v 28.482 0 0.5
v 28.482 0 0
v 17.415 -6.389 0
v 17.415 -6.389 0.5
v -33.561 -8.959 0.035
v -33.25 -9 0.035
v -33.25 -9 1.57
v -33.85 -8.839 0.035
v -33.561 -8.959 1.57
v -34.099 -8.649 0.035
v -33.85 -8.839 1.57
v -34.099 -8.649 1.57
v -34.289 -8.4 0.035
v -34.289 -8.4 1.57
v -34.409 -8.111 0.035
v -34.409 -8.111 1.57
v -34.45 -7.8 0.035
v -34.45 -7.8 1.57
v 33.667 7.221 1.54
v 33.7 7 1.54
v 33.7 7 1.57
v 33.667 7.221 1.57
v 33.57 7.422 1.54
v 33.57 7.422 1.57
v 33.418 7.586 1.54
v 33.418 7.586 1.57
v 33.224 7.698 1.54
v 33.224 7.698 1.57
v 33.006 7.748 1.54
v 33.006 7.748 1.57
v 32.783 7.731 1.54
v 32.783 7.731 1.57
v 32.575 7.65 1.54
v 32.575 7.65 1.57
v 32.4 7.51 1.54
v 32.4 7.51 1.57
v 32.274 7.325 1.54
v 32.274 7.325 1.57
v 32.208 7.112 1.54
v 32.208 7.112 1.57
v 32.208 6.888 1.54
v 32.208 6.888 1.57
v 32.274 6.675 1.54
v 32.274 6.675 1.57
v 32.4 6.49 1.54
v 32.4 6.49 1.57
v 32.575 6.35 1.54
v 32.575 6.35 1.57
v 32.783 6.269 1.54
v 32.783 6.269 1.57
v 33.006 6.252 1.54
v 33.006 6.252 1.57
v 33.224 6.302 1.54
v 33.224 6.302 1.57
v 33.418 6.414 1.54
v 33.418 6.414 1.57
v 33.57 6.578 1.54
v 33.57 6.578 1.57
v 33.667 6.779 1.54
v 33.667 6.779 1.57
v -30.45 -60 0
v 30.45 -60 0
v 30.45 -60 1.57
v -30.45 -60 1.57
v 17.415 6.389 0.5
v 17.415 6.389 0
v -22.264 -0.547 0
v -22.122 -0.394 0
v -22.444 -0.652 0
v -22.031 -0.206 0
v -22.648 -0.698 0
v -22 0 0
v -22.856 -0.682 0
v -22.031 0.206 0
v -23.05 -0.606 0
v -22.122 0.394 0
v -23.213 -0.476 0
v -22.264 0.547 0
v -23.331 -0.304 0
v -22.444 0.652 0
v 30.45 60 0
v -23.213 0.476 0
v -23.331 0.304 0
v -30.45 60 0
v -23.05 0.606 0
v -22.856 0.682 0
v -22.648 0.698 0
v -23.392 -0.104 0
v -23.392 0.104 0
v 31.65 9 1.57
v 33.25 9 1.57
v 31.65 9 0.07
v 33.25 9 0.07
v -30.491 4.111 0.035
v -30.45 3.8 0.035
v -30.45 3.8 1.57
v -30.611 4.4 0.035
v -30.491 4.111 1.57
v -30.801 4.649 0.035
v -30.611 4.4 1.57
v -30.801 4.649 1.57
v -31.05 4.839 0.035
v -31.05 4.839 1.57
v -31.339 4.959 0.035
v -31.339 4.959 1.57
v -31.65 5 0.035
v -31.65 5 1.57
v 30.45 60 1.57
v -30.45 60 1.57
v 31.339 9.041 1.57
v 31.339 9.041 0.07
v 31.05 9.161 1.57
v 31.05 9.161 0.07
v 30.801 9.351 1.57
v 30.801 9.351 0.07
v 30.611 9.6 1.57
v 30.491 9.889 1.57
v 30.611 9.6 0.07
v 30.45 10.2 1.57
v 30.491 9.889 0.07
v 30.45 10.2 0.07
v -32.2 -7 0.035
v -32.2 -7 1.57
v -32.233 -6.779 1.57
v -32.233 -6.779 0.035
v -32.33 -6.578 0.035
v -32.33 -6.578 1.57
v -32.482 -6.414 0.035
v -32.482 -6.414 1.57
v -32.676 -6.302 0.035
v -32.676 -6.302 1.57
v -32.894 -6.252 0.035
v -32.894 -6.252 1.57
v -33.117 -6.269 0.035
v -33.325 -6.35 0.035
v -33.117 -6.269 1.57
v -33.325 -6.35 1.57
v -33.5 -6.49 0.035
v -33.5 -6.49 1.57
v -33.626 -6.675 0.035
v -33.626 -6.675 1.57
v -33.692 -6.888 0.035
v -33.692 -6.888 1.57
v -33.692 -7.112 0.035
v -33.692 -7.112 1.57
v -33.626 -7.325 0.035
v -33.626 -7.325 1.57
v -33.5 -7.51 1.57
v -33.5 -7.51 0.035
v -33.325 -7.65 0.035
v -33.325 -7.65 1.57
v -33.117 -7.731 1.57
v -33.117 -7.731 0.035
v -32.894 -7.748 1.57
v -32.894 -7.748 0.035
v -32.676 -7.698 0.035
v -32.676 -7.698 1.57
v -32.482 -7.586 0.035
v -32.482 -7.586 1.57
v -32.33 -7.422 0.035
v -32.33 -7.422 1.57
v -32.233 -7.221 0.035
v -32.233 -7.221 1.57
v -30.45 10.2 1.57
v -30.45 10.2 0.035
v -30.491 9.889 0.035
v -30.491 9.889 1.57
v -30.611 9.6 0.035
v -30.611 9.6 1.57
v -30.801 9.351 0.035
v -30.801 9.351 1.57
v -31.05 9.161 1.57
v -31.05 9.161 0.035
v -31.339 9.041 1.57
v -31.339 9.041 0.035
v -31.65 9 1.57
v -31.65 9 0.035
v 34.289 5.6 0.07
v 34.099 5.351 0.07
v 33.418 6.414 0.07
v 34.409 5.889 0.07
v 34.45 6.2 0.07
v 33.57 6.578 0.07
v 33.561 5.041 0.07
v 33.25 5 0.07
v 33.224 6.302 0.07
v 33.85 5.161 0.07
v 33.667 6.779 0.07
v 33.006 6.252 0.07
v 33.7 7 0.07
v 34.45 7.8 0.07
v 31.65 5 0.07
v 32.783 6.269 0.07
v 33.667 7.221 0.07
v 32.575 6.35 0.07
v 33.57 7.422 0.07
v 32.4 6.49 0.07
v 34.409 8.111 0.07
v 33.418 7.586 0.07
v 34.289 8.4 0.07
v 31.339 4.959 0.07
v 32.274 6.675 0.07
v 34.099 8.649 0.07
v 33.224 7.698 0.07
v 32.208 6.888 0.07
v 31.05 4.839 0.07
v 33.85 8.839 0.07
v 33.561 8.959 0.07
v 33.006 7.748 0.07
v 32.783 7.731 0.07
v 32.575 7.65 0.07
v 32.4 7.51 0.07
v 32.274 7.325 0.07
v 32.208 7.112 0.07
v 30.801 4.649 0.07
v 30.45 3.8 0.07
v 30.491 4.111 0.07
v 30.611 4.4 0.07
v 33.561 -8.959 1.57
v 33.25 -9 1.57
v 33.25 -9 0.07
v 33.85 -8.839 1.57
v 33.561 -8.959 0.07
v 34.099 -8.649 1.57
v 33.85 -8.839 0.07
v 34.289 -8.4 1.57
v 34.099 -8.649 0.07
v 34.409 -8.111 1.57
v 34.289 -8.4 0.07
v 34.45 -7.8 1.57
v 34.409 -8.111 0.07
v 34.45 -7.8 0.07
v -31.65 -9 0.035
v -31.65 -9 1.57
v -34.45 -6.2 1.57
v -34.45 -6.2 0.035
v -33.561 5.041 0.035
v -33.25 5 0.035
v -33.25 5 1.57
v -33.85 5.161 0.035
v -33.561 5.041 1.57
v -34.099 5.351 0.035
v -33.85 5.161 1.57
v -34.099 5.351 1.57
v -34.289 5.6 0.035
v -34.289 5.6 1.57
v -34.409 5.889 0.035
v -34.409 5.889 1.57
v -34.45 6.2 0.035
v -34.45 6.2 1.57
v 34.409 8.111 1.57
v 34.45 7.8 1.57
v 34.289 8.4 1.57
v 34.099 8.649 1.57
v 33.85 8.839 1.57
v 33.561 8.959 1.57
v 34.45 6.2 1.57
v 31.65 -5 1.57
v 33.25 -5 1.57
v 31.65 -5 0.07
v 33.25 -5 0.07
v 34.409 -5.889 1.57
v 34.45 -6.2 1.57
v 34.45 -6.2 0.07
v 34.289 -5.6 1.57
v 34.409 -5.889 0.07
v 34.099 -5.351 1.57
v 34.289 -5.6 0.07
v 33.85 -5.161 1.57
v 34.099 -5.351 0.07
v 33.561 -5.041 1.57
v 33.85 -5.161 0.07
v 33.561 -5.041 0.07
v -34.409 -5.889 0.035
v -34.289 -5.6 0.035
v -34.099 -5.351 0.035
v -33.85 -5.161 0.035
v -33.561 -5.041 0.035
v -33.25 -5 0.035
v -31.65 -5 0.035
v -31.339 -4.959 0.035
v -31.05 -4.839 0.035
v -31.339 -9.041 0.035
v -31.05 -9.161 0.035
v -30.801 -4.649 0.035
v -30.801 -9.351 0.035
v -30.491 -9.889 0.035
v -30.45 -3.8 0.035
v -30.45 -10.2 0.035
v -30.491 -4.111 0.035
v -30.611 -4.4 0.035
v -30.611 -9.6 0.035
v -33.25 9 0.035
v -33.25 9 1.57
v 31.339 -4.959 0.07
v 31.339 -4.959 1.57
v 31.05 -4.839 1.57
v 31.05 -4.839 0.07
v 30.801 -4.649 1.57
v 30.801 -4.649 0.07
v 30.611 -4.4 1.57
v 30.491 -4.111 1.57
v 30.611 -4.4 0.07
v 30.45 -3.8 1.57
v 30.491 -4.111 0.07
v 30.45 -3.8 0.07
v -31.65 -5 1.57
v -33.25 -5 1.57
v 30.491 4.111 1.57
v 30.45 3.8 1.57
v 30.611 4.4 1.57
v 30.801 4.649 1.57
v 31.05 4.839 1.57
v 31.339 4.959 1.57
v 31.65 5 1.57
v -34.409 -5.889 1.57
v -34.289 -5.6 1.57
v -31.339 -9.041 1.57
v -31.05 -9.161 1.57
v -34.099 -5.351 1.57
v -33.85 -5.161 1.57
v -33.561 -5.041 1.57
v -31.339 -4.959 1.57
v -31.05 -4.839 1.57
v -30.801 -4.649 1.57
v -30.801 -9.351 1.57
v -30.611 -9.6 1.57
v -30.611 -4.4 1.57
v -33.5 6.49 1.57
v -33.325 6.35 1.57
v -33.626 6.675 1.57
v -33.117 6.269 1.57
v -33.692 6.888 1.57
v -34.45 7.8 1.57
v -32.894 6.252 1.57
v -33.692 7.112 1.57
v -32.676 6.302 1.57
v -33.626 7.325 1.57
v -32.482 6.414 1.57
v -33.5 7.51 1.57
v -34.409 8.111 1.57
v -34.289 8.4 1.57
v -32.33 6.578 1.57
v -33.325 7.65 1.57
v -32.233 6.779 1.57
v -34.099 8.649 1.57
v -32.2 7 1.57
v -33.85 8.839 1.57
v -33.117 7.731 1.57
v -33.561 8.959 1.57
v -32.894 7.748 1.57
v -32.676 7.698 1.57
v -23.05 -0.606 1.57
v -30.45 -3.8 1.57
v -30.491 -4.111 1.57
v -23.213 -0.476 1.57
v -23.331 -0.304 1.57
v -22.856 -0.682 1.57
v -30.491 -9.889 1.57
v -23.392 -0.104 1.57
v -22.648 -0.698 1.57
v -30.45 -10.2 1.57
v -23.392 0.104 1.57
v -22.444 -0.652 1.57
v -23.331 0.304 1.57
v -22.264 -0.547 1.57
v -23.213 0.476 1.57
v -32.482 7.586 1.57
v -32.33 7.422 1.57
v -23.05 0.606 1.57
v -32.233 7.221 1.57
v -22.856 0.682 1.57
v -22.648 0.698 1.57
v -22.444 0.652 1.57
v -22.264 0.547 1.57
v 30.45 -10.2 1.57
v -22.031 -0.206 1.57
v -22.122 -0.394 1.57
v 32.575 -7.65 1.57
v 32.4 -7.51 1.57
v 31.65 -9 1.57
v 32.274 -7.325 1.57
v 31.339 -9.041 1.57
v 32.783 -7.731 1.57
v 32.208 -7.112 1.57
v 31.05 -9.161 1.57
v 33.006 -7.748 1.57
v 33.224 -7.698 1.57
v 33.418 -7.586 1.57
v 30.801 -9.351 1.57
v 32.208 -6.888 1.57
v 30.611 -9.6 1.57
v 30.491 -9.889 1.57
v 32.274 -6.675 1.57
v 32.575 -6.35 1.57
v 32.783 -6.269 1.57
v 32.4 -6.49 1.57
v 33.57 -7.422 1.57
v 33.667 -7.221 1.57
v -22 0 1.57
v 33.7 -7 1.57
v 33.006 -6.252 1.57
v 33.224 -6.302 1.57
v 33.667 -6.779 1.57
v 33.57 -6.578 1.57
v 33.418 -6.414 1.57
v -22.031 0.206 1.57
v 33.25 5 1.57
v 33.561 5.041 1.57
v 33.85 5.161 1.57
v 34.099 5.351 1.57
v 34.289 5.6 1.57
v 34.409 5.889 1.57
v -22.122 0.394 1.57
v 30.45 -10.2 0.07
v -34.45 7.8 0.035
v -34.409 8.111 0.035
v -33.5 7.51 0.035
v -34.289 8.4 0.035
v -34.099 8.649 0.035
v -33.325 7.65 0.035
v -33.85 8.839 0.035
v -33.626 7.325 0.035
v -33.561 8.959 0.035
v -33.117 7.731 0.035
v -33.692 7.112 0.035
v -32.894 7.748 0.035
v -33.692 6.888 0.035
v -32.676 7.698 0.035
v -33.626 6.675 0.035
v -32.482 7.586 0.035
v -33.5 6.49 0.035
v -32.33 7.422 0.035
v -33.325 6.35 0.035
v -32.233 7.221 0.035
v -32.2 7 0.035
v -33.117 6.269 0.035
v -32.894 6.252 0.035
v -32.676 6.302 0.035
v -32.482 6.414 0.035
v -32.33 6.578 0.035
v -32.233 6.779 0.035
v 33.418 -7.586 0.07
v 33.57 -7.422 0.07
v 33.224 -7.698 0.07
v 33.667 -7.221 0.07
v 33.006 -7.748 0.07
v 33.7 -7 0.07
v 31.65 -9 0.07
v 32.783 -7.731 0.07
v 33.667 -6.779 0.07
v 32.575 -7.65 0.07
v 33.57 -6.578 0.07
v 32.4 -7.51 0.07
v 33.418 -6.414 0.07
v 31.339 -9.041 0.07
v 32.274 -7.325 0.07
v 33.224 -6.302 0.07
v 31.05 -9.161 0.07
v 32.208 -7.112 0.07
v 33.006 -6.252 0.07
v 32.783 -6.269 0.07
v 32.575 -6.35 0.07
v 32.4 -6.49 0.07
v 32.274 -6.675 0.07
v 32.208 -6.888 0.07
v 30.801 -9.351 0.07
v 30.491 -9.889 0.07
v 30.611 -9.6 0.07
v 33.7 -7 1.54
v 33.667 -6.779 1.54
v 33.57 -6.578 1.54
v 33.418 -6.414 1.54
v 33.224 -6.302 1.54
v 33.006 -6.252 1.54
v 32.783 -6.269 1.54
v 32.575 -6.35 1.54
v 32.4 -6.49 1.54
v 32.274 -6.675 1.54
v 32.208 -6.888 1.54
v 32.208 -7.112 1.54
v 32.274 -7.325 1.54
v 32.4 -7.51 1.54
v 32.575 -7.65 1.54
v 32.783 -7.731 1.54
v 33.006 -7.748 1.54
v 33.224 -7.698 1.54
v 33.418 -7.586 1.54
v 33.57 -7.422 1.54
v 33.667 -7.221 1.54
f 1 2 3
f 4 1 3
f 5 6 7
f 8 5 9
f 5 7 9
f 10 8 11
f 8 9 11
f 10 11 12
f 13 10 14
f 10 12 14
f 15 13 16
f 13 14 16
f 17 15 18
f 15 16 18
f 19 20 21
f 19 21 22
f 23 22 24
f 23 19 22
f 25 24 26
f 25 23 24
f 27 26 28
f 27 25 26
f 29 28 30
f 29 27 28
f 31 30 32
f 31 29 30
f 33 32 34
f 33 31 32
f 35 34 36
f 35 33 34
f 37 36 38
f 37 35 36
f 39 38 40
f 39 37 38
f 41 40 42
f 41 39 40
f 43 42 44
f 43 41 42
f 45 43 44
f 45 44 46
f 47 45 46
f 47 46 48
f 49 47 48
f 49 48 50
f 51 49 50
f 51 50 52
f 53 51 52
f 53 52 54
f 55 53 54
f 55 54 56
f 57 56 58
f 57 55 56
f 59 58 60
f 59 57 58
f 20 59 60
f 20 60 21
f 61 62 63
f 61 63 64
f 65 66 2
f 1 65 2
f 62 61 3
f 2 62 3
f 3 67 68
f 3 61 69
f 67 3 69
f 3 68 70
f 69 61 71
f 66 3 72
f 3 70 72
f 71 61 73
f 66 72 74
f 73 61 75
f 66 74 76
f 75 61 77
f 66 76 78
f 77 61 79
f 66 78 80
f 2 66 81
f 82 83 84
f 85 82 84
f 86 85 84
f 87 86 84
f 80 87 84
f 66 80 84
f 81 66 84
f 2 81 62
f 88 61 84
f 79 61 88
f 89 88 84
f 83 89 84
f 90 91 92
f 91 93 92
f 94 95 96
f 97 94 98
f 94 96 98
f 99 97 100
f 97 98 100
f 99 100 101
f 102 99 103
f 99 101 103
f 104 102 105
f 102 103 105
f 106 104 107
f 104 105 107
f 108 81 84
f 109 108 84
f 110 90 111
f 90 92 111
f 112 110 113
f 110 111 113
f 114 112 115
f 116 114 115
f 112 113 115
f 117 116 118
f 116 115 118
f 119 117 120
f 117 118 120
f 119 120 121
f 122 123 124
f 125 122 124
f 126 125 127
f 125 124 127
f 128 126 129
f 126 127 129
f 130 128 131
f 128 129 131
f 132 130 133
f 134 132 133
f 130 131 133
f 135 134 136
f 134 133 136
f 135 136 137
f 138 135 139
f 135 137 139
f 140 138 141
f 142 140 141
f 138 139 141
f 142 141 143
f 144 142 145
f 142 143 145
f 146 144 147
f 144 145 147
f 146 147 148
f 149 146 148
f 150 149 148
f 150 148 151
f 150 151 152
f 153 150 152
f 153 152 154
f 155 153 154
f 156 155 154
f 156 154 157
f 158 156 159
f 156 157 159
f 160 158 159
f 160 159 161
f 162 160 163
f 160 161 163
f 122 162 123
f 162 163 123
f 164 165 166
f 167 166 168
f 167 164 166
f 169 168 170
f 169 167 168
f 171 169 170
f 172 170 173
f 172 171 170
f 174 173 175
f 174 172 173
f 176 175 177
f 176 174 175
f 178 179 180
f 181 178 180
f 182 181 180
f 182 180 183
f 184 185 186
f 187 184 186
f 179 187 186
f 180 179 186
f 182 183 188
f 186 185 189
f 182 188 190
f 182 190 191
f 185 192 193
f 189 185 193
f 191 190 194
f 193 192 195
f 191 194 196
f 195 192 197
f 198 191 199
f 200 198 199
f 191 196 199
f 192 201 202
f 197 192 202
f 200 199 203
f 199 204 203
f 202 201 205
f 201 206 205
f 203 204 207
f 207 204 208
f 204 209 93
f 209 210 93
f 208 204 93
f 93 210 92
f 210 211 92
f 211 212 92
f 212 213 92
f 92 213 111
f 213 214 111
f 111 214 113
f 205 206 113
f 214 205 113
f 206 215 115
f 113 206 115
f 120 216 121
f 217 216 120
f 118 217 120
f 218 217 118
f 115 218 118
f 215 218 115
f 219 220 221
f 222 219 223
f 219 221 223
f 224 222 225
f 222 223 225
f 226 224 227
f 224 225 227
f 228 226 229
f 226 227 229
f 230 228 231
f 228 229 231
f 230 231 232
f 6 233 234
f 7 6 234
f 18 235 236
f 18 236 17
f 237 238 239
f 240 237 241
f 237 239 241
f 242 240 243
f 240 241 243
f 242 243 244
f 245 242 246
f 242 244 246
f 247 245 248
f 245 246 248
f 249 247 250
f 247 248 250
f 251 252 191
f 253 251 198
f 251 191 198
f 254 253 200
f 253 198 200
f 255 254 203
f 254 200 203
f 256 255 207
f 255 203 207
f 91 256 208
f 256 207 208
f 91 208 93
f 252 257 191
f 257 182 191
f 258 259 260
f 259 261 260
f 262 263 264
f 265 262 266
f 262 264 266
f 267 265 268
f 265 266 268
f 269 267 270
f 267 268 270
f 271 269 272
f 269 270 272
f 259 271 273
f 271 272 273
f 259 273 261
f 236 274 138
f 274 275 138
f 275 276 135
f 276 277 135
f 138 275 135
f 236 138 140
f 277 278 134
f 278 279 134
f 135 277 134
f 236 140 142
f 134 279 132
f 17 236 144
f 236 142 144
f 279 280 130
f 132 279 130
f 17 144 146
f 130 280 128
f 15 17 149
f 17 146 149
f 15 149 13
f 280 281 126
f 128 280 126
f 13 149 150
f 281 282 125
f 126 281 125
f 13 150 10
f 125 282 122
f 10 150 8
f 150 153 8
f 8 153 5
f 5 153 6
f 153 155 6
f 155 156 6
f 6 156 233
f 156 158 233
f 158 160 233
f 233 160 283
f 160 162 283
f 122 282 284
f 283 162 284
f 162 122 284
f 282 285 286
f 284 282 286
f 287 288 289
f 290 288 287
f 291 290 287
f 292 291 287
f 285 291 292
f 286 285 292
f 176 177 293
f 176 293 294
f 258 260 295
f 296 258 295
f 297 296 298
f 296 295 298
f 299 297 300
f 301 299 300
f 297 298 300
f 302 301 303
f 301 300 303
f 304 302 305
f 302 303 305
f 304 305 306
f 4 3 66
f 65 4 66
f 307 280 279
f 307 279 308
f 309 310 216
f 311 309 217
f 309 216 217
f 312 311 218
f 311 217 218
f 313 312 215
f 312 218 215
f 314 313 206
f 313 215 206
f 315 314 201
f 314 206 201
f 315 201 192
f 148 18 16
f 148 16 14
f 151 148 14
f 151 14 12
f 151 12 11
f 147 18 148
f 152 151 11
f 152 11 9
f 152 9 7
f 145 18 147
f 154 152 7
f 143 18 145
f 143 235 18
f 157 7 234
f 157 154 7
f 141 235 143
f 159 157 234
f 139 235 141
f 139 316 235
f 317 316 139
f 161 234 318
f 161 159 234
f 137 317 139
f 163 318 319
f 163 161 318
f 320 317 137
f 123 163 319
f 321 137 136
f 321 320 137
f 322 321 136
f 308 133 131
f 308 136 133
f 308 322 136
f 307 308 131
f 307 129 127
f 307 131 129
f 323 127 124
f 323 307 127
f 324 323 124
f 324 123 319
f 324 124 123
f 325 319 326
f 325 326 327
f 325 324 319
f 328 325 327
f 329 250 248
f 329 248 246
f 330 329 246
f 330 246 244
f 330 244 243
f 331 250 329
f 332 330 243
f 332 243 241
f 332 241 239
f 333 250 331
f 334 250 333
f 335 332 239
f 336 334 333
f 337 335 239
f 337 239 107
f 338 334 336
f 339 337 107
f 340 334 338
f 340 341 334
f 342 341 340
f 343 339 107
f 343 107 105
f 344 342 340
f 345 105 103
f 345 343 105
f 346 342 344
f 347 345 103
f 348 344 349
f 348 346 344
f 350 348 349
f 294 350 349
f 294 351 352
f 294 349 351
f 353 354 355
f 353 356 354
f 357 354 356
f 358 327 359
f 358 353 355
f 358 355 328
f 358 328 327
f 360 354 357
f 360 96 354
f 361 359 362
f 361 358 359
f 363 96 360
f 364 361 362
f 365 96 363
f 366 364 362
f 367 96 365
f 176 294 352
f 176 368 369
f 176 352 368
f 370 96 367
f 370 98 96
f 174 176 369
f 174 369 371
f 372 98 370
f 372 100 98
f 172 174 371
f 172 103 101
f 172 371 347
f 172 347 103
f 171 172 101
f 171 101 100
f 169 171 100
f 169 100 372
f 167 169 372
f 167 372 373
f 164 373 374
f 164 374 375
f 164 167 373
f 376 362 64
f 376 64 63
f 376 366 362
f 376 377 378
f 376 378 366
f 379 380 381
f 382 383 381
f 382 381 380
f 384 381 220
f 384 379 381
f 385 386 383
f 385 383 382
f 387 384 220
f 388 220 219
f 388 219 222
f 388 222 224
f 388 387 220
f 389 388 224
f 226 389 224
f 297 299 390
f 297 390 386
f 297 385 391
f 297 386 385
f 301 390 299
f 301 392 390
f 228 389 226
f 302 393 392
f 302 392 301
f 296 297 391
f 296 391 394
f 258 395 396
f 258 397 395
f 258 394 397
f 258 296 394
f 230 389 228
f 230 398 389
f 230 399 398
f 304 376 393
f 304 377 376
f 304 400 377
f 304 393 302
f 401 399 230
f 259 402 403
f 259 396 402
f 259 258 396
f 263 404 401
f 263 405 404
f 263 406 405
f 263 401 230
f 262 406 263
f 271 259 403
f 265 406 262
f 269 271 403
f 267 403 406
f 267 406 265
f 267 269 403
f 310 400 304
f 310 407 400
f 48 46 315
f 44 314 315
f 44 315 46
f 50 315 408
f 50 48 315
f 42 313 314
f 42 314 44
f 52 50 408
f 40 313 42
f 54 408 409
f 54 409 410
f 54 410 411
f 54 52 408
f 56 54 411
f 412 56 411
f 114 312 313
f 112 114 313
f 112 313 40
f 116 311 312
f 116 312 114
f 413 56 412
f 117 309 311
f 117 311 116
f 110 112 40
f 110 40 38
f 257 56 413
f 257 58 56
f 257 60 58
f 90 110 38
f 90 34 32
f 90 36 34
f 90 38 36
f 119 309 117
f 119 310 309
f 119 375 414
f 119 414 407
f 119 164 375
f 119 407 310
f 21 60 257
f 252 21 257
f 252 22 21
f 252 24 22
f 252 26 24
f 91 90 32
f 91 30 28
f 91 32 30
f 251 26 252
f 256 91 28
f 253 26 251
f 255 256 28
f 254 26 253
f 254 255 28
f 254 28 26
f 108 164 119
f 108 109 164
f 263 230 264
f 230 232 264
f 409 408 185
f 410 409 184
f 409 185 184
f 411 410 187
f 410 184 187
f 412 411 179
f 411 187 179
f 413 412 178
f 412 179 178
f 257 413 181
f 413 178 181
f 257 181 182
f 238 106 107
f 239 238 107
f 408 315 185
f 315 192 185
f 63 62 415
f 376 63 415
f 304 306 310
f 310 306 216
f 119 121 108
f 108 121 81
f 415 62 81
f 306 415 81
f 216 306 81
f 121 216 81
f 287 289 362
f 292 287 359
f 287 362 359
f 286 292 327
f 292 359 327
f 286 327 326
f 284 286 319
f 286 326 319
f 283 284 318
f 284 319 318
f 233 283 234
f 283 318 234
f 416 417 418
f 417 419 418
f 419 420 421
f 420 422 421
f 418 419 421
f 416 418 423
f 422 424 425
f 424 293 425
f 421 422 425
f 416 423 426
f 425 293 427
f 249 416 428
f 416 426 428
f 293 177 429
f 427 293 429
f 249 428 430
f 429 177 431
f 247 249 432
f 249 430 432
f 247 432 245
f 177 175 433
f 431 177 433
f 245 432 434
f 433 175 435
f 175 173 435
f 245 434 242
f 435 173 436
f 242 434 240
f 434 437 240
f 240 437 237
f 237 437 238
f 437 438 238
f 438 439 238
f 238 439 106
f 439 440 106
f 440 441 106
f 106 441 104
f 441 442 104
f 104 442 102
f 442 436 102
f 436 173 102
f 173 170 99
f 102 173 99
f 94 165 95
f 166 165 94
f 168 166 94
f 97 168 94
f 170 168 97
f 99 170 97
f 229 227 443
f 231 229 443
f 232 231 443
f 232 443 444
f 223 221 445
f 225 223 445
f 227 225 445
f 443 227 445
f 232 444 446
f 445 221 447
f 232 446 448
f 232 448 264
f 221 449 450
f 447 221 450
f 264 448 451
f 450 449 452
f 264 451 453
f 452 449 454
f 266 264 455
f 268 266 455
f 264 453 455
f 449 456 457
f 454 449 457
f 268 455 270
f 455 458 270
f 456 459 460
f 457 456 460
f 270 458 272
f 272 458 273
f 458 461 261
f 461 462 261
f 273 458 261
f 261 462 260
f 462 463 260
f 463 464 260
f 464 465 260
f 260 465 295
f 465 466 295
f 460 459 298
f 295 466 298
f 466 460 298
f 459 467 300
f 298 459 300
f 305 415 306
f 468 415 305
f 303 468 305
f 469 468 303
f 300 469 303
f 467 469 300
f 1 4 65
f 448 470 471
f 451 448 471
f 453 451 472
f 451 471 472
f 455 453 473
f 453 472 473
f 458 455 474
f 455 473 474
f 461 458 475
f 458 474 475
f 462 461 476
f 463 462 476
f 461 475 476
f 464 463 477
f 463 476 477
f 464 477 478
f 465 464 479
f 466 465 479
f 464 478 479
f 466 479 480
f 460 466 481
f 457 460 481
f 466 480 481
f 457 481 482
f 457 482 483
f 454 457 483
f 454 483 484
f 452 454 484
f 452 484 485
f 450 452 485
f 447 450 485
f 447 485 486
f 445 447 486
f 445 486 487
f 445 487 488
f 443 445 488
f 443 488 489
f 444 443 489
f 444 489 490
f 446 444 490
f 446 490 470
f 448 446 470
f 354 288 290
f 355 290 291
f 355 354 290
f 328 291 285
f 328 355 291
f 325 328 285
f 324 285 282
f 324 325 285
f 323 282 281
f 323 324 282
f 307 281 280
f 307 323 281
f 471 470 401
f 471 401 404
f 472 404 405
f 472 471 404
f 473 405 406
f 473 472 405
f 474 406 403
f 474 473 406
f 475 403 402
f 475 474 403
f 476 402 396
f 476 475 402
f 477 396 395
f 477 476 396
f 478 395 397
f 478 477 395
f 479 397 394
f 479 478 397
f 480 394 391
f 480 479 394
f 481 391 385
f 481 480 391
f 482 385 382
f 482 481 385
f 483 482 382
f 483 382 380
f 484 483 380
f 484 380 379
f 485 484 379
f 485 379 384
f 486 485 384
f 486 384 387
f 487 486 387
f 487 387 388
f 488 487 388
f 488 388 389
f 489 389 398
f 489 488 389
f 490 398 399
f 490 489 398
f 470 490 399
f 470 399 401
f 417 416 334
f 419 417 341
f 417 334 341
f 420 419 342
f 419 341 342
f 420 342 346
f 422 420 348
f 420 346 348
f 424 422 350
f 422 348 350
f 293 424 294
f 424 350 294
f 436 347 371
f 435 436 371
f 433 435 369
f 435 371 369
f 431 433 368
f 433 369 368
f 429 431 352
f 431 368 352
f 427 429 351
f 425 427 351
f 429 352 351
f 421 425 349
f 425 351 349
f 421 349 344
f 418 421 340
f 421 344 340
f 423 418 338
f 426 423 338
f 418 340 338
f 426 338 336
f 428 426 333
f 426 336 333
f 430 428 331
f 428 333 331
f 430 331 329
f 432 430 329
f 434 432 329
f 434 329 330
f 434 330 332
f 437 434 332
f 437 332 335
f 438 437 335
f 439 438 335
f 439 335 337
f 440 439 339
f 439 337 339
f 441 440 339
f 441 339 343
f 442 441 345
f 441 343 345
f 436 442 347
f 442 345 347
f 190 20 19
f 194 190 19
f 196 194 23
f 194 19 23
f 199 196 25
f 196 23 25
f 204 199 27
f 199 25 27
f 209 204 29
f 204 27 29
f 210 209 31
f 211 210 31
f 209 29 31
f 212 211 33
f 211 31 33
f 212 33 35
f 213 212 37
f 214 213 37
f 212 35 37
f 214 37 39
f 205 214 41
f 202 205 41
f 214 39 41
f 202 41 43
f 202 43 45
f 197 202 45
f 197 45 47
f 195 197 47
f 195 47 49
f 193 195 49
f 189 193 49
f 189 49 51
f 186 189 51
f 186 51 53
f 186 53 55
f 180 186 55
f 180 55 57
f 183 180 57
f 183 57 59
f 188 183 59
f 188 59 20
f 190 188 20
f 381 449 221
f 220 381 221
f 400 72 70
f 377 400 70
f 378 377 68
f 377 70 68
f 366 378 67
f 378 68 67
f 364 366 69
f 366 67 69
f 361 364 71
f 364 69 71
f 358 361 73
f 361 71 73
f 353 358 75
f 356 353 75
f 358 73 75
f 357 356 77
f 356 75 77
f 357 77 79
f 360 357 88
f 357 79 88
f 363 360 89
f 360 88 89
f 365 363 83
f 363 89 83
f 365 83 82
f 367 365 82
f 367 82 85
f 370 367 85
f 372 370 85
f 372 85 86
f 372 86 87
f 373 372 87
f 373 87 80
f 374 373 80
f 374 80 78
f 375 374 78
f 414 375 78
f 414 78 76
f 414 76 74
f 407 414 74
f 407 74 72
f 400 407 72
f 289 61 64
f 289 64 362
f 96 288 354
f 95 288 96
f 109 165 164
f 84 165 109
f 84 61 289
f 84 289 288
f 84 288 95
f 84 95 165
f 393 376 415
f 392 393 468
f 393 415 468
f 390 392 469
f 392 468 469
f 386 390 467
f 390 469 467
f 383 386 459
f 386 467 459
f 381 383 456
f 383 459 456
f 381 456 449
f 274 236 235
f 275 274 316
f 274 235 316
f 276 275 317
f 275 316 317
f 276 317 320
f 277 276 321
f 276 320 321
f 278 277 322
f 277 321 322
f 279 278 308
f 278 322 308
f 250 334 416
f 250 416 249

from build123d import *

# Parameters (mm, degrees)
SKETCH1_W               = 120
SKETCH1_H               = 60.9
BOSS_EXTRUDE1_DEPTH     = 1.61
CUT_EXTRUDE1_DEPTH      = 0.5
SKETCH3_W               = 4
SKETCH3_H               = 1.54
BOSS_EXTRUDE2_DEPTH     = 4
SKETCH5_W               = 4
SKETCH5_H               = 1.47
BOSS_EXTRUDE3_DEPTH     = 4
SKETCH7_R               = 0.75
CUT_EXTRUDE3_DEPTH      = 1.07
CUT_EXTRUDE3_DEPTH_BACK = 2.54
FILLET1_R               = 1.2
FILLET2_R               = 1.2
SKETCH8_R               = 0.7
CUT_EXTRUDE4_DEPTH      = 2.61
SKETCH13_W              = 60.9
SKETCH13_H              = 120
CUT_EXTRUDE5_DEPTH      = 0.04
SKETCH14_R              = 0.75
BOSS_EXTRUDE4_DEPTH     = 0.03
SKETCH15_R              = 0.75
CUT_EXTRUDE6_DEPTH      = 0.005


with BuildPart() as part:
    # Sketch1 → Boss-Extrude1 (new body)
    with BuildSketch(Plane(origin=(0, 0, 0), x_dir=(0, 1, 0), z_dir=(0, 0, 1))):
        Rectangle(SKETCH1_W, SKETCH1_H)
    extrude(amount=BOSS_EXTRUDE1_DEPTH)

    # Sketch2 → Cut-Extrude1 (cut)
    with BuildSketch(Plane(origin=(0, 0, 0), x_dir=(1, 0, 0), z_dir=(0, 0, -1))):
        Polygon((28.481704711, 0), (17.415141609, 6.389283186), (17.415141609, -6.389283186), align=None)
    extrude(amount=-CUT_EXTRUDE1_DEPTH, mode=Mode.SUBTRACT)

    # Sketch3 → Boss-Extrude2 (add)
    with BuildSketch(Plane(origin=(-30.45, 0, 0), x_dir=(0, -1, 0), z_dir=(-1, 0, 0))):
        with Locations((-7, 0.805)):
            Rectangle(SKETCH3_W, SKETCH3_H)
        with Locations((7, 0.805)):
            Rectangle(SKETCH3_W, SKETCH3_H)
    extrude(amount=BOSS_EXTRUDE2_DEPTH)

    # Sketch5 → Boss-Extrude3 (add)
    with BuildSketch(Plane.YZ.offset(30.45)):
        with Locations((7, 0.805)):
            Rectangle(SKETCH5_W, SKETCH5_H)
        with Locations((-7, 0.805)):
            Rectangle(SKETCH5_W, SKETCH5_H)
    extrude(amount=BOSS_EXTRUDE3_DEPTH)

    # Sketch7 → Cut-Extrude3 (cut, two sides)
    with BuildSketch(Plane.XY.offset(1.54)) as cut_extrude3_sk:
        with Locations((32.95, 7)):
            Circle(SKETCH7_R)
        with Locations((32.95, -7)):
            Circle(SKETCH7_R)
        with Locations((-32.95, -7)):
            Circle(SKETCH7_R)
        with Locations((-32.95, 7)):
            Circle(SKETCH7_R)
    extrude(amount=CUT_EXTRUDE3_DEPTH, mode=Mode.SUBTRACT)
    extrude(cut_extrude3_sk.sketch, amount=-CUT_EXTRUDE3_DEPTH_BACK, mode=Mode.SUBTRACT)

    # Fillet1
    fillet1_edges = [part.edges().sort_by_distance(p)[0] for p in [
        (-30.45, 5, 0.805),
        (-30.45, 9, 0.805),
        (-30.45, -9, 0.805),
        (-30.45, -5, 0.805),
        (30.45, 9, 0.805),
        (30.45, 5, 0.805),
        (30.45, -5, 0.805),
        (30.45, -9, 0.805),
    ]]
    fillet(fillet1_edges, radius=FILLET1_R)

    # Fillet2
    fillet2_edges = [part.edges().sort_by_distance(p)[0] for p in [
        (-34.45, 9, 0.805),
        (-34.45, 5, 0.805),
        (-34.45, -5, 0.805),
        (-34.45, -9, 0.805),
        (34.45, 5, 0.805),
        (34.45, 9, 0.805),
        (34.45, -9, 0.805),
        (34.45, -5, 0.805),
    ]]
    fillet(fillet2_edges, radius=FILLET2_R)

    # Sketch8 → Cut-Extrude4 (cut, through all)
    with BuildSketch(Plane(origin=(0, 0, 0), x_dir=(1, 0, 0), z_dir=(0, 0, -1))):
        with Locations((-22.7, 0)):
            Circle(SKETCH8_R)
    extrude(amount=-CUT_EXTRUDE4_DEPTH, mode=Mode.SUBTRACT)

    # Sketch13 → Cut-Extrude5 (cut)
    with BuildSketch(Plane.XY.offset(1.61)):
        Rectangle(SKETCH13_W, SKETCH13_H)
    extrude(amount=-CUT_EXTRUDE5_DEPTH, mode=Mode.SUBTRACT)

    # Sketch14 → Boss-Extrude4 (add)
    with BuildSketch(Plane.XY.offset(1.54)):
        with BuildLine():
            Line((31.65, -9), (33.25, -9))
            ThreePointArc((33.25, -9), (34.098528137, -8.648528137), (34.45, -7.8))
            Line((34.45, -7.8), (34.45, -6.2))
            ThreePointArc((34.45, -6.2), (34.098528137, -5.351471863), (33.25, -5))
            Line((33.25, -5), (31.65, -5))
            ThreePointArc((31.65, -5), (30.801471863, -4.648528137), (30.45, -3.8))
            Line((30.45, -3.8), (30.45, -10.2))
            ThreePointArc((30.45, -10.2), (30.801471863, -9.351471863), (31.65, -9))
        make_face()
        with Locations((32.95, -7)):
            Circle(SKETCH14_R, mode=Mode.SUBTRACT)
        with BuildLine():
            Line((34.45, 6.2), (34.45, 7.8))
            ThreePointArc((34.45, 7.8), (34.098528137, 8.648528137), (33.25, 9))
            Line((33.25, 9), (31.65, 9))
            ThreePointArc((31.65, 9), (30.801471863, 9.351471863), (30.45, 10.2))
            Line((30.45, 10.2), (30.45, 3.8))
            ThreePointArc((30.45, 3.8), (30.801471863, 4.648528137), (31.65, 5))
            Line((31.65, 5), (33.25, 5))
            ThreePointArc((33.25, 5), (34.098528137, 5.351471863), (34.45, 6.2))
        make_face()
        with Locations((32.95, 7)):
            Circle(SKETCH14_R, mode=Mode.SUBTRACT)
    extrude(amount=BOSS_EXTRUDE4_DEPTH)

    # Sketch15 → Cut-Extrude6 (cut)
    with BuildSketch(Plane.XY.offset(1.575)):
        with BuildLine():
            Line((-34.45, 7.8), (-34.45, 6.2))
            ThreePointArc((-34.45, 6.2), (-34.098528137, 5.351471863), (-33.25, 5))
            Line((-33.25, 5), (-31.65, 5))
            ThreePointArc((-31.65, 5), (-30.801471863, 4.648528137), (-30.45, 3.8))
            Line((-30.45, 3.8), (-30.45, 10.2))
            ThreePointArc((-30.45, 10.2), (-30.801471863, 9.351471863), (-31.65, 9))
            Line((-31.65, 9), (-33.25, 9))
            ThreePointArc((-33.25, 9), (-34.098528137, 8.648528137), (-34.45, 7.8))
        make_face()
        with Locations((-32.95, 7)):
            Circle(SKETCH15_R, mode=Mode.SUBTRACT)
        with BuildLine():
            Line((-34.45, -6.2), (-34.45, -7.8))
            ThreePointArc((-34.45, -7.8), (-34.098528137, -8.648528137), (-33.25, -9))
            Line((-33.25, -9), (-31.65, -9))
            ThreePointArc((-31.65, -9), (-30.801471863, -9.351471863), (-30.45, -10.2))
            Line((-30.45, -10.2), (-30.45, -3.8))
            ThreePointArc((-30.45, -3.8), (-30.801471863, -4.648528137), (-31.65, -5))
            Line((-31.65, -5), (-33.25, -5))
            ThreePointArc((-33.25, -5), (-34.098528137, -5.351471863), (-34.45, -6.2))
        make_face()
        with Locations((-32.95, -7)):
            Circle(SKETCH15_R, mode=Mode.SUBTRACT)
    extrude(amount=-CUT_EXTRUDE6_DEPTH, mode=Mode.SUBTRACT)


solid = part.part
